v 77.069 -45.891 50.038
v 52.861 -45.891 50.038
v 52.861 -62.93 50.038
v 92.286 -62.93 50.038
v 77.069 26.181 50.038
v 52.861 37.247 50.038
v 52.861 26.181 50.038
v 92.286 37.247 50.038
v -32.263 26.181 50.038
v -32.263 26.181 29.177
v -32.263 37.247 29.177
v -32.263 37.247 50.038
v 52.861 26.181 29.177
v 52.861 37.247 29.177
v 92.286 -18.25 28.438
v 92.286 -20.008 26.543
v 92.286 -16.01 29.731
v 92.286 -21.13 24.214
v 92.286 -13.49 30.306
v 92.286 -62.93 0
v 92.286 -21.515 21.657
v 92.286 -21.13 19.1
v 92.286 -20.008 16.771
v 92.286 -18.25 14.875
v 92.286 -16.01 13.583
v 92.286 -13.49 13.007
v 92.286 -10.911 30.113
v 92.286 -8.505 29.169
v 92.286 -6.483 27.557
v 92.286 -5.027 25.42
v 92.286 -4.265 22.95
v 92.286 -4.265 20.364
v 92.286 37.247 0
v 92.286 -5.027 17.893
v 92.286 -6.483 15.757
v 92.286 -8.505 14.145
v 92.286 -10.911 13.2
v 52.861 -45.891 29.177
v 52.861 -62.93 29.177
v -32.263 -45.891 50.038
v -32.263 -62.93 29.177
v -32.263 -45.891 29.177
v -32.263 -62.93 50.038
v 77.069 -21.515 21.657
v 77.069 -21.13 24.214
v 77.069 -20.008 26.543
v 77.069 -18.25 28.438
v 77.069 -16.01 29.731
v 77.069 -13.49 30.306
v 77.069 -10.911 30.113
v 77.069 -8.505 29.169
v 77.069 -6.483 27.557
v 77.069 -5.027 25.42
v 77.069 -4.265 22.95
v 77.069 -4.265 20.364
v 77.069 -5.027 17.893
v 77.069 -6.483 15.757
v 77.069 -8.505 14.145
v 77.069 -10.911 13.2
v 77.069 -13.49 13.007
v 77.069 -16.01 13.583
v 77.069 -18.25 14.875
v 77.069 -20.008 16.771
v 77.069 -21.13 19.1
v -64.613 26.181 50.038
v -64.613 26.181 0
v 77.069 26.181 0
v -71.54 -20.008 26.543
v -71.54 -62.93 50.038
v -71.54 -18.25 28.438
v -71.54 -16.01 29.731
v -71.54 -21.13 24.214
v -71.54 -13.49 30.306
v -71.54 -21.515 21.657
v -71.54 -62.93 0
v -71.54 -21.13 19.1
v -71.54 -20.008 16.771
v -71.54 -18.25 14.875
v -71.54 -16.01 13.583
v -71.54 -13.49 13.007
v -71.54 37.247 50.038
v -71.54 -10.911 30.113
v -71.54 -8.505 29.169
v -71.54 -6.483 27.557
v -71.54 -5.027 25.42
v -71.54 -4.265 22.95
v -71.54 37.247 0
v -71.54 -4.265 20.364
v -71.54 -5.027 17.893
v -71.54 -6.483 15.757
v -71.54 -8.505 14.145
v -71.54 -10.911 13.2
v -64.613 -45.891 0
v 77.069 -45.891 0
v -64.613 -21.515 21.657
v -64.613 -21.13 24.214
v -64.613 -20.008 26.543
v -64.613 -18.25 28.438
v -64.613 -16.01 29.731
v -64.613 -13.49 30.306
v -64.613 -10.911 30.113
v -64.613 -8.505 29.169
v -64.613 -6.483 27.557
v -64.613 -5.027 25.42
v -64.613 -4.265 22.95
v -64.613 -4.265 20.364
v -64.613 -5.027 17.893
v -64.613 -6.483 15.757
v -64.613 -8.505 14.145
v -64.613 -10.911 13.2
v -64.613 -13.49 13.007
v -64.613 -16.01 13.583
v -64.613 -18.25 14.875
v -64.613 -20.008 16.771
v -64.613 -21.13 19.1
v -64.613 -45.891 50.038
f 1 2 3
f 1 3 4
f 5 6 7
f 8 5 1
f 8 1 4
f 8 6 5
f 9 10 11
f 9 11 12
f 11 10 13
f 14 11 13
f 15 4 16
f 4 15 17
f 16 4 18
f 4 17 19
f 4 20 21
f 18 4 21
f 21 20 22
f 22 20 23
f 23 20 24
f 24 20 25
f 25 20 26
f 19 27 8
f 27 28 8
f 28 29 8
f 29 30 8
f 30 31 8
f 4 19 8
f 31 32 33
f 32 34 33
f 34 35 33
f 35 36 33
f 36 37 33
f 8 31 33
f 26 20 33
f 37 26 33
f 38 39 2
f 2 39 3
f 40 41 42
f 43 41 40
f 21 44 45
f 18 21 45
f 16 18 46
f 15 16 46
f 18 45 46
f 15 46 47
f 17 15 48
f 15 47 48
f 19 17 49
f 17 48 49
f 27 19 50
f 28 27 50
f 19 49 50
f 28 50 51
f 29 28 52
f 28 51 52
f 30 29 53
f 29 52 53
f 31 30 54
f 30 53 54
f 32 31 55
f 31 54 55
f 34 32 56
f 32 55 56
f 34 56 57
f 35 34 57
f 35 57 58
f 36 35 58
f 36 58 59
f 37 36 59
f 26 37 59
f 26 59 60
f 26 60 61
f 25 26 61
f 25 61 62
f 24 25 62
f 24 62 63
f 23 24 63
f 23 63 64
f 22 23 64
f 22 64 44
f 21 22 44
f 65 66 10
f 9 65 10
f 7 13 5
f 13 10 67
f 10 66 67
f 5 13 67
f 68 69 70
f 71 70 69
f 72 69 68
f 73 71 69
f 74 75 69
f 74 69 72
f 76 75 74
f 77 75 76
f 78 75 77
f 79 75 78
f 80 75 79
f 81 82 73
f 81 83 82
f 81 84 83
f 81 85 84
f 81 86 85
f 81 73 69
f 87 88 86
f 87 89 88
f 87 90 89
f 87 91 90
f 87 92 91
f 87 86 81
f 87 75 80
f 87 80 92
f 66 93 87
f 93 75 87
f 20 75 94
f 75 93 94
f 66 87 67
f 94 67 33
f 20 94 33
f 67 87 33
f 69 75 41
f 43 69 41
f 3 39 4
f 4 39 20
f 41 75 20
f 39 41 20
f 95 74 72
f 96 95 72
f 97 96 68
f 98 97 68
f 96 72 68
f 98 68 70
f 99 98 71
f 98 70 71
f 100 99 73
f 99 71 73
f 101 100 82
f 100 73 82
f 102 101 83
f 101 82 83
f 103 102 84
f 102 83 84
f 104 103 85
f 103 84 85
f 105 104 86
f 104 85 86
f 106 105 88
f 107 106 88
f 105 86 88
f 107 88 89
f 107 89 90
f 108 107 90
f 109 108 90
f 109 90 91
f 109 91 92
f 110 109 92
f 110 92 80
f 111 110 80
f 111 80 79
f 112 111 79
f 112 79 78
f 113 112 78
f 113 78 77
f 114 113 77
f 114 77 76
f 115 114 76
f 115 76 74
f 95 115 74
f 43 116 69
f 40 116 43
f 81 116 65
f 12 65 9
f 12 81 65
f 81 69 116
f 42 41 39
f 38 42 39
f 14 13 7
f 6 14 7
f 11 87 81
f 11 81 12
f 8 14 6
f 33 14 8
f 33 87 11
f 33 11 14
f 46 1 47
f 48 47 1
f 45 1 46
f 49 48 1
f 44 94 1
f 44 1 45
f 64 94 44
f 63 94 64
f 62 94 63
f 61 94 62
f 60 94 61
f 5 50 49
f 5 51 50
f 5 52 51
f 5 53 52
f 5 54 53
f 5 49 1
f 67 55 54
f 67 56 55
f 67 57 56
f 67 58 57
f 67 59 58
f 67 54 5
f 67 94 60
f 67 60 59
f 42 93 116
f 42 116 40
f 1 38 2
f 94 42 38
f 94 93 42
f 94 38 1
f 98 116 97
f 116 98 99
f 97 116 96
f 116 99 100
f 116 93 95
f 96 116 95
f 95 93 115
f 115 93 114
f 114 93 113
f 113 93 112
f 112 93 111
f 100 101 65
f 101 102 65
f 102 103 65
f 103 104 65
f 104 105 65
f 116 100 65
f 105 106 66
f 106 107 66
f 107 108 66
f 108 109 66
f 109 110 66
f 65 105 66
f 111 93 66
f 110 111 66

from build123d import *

# Parameters (mm, degrees)
F0_W     = 163.8257876039
F0_H     = 100.1764573157
F0_W_2   = 141.6816487908
F0_H_2   = 72.07223773
F1_DEPTH = 50.038
F2_W     = 85.1234197617
F2_H     = 20.8614202117
F3_DEPTH = 132.842
F4_R     = 8.6739070384
F5_DEPTH = 191.516


with BuildPart() as f1:
    # F0 (on Top) → F1 (new body)
    with BuildSketch(Plane.XY):
        with Locations((10.3731565177, -12.8415655345)):
            Rectangle(F0_W, F0_H)
        with Locations((6.2276907265, -9.8548047245)):
            Rectangle(F0_W_2, F0_H_2, mode=Mode.SUBTRACT)
    extrude(amount=F1_DEPTH)

    # F2 (on face) → F3 (cut)
    with BuildSketch(Plane.XZ.offset(62.9297941923)):
        with Locations((10.2989450097, 39.6072898942)):
            Rectangle(F2_W, F2_H)
    extrude(amount=-F3_DEPTH, mode=Mode.SUBTRACT)

    # F4 (on face) → F5 (cut)
    with BuildSketch(Plane(origin=(-71.5397372842, 0, 0), x_dir=(0, -1, 0), z_dir=(-1, 0, 0))):
        with Locations((12.8415655345, 21.6568429023)):
            Circle(F4_R)
    extrude(amount=-F5_DEPTH, mode=Mode.SUBTRACT)


solid = f1.part
